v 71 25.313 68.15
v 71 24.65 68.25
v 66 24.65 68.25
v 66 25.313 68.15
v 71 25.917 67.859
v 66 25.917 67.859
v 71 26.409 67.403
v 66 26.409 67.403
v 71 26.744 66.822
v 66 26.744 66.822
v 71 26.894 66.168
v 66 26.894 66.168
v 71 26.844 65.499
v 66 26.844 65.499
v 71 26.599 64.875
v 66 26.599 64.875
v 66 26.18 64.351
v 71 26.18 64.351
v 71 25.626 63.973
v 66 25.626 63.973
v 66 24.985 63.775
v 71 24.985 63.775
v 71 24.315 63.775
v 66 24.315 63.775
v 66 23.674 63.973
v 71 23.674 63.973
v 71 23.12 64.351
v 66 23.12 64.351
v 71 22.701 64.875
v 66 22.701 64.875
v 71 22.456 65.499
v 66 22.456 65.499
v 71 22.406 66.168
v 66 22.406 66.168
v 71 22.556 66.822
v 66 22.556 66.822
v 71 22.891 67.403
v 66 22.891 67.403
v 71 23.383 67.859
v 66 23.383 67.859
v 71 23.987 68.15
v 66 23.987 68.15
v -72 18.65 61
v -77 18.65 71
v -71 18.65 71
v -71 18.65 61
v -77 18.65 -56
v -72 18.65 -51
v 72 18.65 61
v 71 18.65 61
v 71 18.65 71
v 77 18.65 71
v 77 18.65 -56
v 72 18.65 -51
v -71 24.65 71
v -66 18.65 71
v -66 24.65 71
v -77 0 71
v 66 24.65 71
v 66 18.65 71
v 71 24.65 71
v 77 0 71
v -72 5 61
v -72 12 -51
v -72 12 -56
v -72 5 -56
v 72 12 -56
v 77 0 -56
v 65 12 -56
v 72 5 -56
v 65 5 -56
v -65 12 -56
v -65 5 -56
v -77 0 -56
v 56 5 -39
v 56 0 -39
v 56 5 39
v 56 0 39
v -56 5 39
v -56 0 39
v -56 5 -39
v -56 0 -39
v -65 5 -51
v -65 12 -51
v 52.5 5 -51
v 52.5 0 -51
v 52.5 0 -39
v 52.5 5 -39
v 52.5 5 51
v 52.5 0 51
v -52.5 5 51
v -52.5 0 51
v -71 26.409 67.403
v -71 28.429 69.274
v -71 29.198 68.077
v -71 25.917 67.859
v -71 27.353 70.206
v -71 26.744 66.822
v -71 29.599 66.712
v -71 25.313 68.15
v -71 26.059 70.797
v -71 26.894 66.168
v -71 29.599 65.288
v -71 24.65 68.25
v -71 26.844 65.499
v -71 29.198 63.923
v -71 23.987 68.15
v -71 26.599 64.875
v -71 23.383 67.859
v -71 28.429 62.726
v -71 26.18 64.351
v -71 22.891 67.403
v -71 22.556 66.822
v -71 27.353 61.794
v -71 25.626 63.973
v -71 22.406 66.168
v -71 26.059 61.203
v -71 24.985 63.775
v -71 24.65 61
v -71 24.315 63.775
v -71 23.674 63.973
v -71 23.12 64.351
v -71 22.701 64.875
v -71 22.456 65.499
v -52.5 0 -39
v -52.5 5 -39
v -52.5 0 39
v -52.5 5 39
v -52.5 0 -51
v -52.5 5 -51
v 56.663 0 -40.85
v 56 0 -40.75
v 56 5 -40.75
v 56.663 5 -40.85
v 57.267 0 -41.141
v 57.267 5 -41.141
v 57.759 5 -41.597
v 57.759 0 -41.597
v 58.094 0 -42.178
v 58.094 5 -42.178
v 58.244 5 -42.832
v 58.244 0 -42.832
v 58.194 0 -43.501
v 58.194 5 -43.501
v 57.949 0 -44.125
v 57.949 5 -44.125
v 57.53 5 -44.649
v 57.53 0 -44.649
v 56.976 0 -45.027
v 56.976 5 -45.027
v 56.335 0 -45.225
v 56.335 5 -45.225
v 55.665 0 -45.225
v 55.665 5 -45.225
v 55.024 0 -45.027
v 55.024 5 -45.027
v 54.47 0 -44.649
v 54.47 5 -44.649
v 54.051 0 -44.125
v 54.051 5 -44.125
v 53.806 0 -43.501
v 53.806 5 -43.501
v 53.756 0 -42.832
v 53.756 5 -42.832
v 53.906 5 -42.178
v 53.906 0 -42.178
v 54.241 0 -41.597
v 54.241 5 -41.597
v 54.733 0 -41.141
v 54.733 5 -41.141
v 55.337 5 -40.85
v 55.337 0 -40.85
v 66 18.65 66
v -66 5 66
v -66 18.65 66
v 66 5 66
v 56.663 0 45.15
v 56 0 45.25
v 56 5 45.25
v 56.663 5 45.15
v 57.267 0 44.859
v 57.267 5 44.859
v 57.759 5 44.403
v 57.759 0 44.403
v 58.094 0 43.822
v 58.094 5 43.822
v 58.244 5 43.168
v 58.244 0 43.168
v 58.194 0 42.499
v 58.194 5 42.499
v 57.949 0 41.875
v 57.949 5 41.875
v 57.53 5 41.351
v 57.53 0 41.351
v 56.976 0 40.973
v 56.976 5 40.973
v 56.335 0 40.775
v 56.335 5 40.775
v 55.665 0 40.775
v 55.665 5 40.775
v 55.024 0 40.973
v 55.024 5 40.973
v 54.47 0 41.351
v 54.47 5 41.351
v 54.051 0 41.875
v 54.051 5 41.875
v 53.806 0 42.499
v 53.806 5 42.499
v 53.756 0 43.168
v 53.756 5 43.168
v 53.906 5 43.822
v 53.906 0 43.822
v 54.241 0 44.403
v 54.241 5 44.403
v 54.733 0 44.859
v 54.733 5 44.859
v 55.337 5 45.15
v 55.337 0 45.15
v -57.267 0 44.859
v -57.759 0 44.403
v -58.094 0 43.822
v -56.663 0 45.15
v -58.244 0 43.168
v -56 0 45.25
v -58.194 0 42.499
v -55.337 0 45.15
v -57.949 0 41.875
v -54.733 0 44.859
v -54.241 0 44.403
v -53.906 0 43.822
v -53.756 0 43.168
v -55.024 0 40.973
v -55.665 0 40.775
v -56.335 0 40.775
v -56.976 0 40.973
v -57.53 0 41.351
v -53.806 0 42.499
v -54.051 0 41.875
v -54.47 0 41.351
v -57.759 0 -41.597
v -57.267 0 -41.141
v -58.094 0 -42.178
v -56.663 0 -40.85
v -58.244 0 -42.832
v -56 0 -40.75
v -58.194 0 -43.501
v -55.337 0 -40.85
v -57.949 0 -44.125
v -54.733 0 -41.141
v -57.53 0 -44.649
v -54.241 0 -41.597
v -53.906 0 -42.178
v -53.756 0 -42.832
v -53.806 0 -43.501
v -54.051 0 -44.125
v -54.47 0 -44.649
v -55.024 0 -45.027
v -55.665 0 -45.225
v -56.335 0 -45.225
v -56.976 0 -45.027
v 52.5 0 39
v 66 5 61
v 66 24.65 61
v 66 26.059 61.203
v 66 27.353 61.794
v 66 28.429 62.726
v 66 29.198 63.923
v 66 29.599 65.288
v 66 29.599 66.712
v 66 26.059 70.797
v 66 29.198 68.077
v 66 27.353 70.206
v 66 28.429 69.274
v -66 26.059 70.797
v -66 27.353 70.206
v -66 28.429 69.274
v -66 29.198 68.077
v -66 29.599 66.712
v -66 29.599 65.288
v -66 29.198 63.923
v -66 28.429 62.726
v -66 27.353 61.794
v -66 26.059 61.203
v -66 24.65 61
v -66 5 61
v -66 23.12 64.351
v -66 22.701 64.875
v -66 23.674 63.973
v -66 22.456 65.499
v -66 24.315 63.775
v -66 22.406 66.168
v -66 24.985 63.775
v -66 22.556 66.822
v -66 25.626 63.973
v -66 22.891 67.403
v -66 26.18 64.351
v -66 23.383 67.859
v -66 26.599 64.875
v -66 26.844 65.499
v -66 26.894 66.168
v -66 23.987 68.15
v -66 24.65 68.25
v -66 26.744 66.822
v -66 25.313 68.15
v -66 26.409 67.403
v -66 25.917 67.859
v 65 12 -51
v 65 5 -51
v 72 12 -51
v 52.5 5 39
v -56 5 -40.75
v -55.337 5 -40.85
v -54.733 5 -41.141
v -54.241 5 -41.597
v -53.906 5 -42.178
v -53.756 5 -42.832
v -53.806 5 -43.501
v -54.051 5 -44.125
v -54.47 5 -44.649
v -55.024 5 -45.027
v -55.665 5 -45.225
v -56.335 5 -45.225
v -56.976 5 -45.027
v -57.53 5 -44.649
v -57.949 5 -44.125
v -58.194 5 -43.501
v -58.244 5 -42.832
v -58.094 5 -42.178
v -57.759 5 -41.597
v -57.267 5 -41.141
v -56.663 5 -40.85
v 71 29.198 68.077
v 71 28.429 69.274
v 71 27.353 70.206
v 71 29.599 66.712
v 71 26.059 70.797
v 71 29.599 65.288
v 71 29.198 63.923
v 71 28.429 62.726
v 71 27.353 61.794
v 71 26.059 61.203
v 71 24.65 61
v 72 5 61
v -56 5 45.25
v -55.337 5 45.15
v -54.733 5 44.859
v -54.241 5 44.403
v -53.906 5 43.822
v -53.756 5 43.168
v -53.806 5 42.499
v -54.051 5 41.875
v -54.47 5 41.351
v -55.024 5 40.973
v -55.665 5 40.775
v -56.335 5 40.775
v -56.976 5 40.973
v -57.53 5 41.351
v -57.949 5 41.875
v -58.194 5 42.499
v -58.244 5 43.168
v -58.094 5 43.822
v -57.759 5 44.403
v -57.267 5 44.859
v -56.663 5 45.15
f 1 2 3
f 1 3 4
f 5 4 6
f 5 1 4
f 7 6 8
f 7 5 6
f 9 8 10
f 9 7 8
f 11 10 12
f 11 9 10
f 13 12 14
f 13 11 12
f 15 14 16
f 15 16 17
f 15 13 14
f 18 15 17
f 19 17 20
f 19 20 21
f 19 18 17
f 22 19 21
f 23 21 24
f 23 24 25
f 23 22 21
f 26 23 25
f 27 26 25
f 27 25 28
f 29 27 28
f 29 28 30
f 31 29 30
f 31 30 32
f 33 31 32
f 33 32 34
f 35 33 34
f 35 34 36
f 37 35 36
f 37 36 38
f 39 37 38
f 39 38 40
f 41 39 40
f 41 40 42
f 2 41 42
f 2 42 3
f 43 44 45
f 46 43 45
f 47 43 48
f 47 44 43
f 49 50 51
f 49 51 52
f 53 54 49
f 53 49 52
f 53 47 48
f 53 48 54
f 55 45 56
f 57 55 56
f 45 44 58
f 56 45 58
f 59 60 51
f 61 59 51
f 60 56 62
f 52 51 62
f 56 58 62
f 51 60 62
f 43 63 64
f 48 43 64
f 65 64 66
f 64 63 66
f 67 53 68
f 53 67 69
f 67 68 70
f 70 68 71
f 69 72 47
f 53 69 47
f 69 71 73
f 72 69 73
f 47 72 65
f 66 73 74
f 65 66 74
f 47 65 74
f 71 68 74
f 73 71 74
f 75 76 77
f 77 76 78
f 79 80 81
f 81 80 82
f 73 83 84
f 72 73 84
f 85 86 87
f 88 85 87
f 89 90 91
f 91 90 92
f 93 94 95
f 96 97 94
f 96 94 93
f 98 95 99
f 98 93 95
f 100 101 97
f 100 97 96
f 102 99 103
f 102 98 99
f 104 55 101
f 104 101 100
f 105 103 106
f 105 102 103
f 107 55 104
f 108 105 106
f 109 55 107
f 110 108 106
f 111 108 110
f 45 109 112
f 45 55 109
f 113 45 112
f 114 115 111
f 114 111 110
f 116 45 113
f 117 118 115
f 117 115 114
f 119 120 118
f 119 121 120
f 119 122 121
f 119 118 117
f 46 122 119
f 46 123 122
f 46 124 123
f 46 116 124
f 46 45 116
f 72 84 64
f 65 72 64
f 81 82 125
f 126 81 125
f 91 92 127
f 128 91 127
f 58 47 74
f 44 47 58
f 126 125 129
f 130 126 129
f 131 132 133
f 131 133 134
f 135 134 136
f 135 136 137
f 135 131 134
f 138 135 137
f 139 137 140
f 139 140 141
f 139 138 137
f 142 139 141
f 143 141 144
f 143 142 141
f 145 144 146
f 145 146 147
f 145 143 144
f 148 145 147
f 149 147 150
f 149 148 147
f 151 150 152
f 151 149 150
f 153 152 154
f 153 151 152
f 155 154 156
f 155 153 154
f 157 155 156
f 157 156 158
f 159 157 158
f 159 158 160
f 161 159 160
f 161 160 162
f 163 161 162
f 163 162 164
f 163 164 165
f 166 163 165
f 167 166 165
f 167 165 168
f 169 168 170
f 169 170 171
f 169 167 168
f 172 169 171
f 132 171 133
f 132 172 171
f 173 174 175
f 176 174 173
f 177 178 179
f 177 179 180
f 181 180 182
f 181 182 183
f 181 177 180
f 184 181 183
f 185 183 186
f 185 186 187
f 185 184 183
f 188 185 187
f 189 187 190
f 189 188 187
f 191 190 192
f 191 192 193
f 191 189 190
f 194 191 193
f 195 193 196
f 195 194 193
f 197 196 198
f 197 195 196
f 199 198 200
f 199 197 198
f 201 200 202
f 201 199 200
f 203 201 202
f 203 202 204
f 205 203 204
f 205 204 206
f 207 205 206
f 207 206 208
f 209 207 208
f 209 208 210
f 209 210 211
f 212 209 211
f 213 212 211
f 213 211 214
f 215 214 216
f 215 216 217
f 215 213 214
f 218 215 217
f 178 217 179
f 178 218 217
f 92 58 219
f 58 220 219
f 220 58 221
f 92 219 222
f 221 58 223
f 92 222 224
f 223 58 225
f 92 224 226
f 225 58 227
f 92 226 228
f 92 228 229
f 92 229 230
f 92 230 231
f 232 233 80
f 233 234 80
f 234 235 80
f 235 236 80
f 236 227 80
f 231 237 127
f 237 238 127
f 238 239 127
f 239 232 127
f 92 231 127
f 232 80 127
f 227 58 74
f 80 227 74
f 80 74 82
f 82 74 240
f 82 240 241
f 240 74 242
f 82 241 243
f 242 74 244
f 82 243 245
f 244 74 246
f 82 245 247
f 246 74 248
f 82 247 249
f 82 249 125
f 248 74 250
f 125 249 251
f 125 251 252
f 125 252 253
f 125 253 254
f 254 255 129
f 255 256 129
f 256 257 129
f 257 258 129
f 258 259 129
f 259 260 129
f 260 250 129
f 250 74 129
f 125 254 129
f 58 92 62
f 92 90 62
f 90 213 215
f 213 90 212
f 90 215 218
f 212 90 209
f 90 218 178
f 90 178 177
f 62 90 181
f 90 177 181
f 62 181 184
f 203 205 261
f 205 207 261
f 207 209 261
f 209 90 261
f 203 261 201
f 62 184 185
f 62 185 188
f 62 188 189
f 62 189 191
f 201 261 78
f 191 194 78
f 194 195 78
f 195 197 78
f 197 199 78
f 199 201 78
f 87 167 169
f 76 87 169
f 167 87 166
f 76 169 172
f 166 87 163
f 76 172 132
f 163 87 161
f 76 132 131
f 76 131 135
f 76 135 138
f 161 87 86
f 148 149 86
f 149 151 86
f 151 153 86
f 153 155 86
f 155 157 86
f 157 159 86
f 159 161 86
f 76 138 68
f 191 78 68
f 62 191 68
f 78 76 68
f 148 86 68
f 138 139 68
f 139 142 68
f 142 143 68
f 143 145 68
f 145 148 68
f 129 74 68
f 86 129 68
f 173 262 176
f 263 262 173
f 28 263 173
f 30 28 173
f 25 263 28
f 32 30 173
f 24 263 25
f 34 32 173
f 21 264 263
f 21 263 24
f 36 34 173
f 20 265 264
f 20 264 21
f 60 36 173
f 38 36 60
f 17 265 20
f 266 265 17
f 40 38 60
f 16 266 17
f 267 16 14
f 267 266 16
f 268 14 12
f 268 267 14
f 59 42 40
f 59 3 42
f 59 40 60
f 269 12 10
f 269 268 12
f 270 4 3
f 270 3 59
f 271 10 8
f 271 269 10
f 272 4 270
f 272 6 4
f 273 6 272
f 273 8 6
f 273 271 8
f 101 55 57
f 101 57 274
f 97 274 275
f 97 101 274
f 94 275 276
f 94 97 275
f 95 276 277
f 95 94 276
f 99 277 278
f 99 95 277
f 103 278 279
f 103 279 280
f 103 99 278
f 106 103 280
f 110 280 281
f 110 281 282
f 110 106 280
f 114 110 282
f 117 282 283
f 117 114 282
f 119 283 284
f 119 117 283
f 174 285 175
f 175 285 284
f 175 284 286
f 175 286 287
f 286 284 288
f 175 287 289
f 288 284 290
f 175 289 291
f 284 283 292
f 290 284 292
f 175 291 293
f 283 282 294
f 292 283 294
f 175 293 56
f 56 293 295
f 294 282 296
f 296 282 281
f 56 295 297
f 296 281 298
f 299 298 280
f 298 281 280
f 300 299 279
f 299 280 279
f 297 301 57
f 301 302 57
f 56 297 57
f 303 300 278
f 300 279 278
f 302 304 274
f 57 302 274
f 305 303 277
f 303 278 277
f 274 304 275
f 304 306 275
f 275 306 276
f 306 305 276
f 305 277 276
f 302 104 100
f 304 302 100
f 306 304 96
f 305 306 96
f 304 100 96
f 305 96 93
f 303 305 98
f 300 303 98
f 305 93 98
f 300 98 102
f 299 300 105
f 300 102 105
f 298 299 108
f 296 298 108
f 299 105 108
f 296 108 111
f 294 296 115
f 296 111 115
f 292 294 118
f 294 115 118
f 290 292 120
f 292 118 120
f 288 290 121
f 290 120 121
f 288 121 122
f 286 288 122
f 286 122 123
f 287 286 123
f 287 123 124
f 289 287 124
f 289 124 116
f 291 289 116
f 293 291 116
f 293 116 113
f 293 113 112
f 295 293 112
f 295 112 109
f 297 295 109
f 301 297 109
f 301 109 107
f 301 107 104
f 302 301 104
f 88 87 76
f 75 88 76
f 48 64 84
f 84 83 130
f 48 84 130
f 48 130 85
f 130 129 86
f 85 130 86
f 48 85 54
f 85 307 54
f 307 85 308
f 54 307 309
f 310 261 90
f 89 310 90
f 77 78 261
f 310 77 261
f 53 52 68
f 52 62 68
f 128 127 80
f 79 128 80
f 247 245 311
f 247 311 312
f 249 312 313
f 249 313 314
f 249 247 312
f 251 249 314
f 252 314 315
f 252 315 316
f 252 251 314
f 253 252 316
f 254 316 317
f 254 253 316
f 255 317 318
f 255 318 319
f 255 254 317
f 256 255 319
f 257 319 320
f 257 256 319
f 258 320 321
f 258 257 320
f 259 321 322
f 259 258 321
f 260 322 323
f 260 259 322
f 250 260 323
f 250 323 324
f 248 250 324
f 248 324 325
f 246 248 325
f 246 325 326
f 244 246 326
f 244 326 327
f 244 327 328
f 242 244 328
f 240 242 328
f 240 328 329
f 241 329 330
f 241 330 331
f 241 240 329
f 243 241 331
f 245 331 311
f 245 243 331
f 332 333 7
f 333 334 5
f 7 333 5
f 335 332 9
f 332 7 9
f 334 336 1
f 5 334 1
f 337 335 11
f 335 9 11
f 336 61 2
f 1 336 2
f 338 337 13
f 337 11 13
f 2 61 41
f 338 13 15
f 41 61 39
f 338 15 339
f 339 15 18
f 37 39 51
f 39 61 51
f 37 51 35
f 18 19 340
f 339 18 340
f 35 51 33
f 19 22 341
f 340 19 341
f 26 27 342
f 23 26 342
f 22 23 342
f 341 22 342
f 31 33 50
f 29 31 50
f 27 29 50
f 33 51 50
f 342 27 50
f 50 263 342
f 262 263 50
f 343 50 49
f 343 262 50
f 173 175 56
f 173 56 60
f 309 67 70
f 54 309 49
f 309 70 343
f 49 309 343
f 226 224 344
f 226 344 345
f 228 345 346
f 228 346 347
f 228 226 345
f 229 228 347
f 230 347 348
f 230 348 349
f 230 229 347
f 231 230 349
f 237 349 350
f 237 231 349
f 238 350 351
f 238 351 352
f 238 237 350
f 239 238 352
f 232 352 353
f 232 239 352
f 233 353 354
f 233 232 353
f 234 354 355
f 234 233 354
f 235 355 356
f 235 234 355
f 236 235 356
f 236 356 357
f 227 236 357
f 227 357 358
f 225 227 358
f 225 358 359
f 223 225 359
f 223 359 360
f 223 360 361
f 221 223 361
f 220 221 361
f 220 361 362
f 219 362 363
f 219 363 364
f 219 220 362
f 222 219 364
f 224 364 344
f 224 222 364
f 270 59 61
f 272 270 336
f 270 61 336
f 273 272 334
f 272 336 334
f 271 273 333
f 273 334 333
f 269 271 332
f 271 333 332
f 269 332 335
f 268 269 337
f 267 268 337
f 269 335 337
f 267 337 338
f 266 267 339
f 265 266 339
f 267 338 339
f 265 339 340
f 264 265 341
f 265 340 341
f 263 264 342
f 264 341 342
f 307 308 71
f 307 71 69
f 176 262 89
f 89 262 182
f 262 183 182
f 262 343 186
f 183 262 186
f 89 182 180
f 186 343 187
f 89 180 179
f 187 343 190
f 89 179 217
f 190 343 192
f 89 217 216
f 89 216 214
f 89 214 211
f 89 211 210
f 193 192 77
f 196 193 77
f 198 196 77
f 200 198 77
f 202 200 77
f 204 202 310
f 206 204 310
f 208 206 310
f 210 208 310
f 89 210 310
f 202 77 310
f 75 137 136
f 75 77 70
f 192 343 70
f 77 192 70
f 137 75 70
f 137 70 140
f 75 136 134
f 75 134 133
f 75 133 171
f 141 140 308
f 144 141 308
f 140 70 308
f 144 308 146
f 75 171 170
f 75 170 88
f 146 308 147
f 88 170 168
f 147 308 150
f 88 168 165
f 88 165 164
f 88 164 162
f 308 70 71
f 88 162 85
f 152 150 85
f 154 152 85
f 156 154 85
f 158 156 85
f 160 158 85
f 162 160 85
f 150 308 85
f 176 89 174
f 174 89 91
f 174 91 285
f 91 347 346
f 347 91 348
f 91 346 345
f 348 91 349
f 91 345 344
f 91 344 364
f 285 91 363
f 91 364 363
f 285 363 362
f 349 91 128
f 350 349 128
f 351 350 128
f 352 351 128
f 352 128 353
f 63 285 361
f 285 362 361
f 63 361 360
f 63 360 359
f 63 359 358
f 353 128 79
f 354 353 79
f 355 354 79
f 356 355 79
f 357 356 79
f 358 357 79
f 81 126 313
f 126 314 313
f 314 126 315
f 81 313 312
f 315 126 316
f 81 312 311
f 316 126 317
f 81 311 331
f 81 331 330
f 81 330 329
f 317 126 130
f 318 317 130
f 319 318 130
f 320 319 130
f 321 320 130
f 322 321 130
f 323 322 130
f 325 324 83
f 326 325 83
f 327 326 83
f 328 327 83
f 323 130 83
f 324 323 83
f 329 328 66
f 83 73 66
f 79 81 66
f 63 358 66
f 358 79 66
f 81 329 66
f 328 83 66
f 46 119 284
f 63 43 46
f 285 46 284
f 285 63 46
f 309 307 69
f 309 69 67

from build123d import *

# Parameters (mm, degrees)
SKETCH1_W           = 154
SKETCH1_H           = 127
SKETCH1_R           = 2.25
BOSS_EXTRUDE1_DEPTH = 5
SKETCH2_R           = 2.25
BOSS_EXTRUDE2_DEPTH = 11
SKETCH4_W           = 6
SKETCH4_H           = 10
CUT_EXTRUDE1_DEPTH  = 37
SKETCH5_W           = 132
SKETCH5_H           = 5
SKETCH5_W_2         = 1
SKETCH5_W_3         = 6
BOSS_EXTRUDE3_DEPTH = 13.65
SKETCH6_W           = 7
SKETCH6_H           = 7
CUT_EXTRUDE2_DEPTH  = 13.65


with BuildPart() as part:
    # Sketch1 → Boss-Extrude1 (new body)
    with BuildSketch(Plane(origin=(0, 0, 0), x_dir=(1, 0, 0), z_dir=(0, 1, 0))):
        with Locations((0, -7.5)):
            Rectangle(SKETCH1_W, SKETCH1_H)
        with Locations(Location((-56, -43, 0), (0, 0, 270))):
            Circle(SKETCH1_R, mode=Mode.SUBTRACT)
        with Locations(Location((56, -43, 0), (0, 0, 270))):
            Circle(SKETCH1_R, mode=Mode.SUBTRACT)
        with Locations(Location((-56, 43, 0), (0, 0, 270))):
            Circle(SKETCH1_R, mode=Mode.SUBTRACT)
        Polygon((52.5, -39), (52.5, -51), (-52.5, -51), (-52.5, -39), (-56, -39), (-56, 39), (-52.5, 39), (-52.5, 51), (52.5, 51), (52.5, 39), (56, 39), (56, -39), align=None, mode=Mode.SUBTRACT)
        with Locations(Location((56, 43, 0), (0, 0, 270))):
            Circle(SKETCH1_R, mode=Mode.SUBTRACT)
    extrude(amount=BOSS_EXTRUDE1_DEPTH)

    # Sketch2 → Boss-Extrude2 (add)
    with BuildSketch(Plane.ZY.offset(77)):
        with BuildLine():
            ThreePointArc((71, 24.65), (66, 29.65), (61, 24.65))
            Line((61, 24.65), (61, 5))
            Line((61, 5), (71, 5))
            Line((71, 5), (71, 24.65))
        make_face()
        with Locations((66, 24.65)):
            Circle(SKETCH2_R, mode=Mode.SUBTRACT)
    boss_extrude2 = extrude(amount=-BOSS_EXTRUDE2_DEPTH)

    # Sketch4 → Cut-Extrude1 (cut)
    with BuildSketch(Plane(origin=(0, 5, 0), x_dir=(1, 0, 0), z_dir=(0, 1, 0))):
        with Locations((-74, -66)):
            Rectangle(SKETCH4_W, SKETCH4_H)
    cut_extrude1 = extrude(amount=CUT_EXTRUDE1_DEPTH, mode=Mode.SUBTRACT)

    # Mirror1: Boss-Extrude2, Cut-Extrude1 across plane
    add(boss_extrude2.mirror(Plane(origin=(0, 0, 0), x_dir=(0, 0, 1), z_dir=(1, 0, 0))))
    add(cut_extrude1.mirror(Plane(origin=(0, 0, 0), x_dir=(0, 0, 1), z_dir=(1, 0, 0))), mode=Mode.SUBTRACT)

    # Sketch5 → Boss-Extrude3 (add)
    with BuildSketch(Plane(origin=(0, 5, 0), x_dir=(1, 0, 0), z_dir=(0, 1, 0))):
        Polygon((71, -71), (77, -71), (77, 56), (-77, 56), (-77, -71), (-71, -71), (-71, -66), (-72, -66), (-72, -61), (-72, 51), (-52.5, 51), (52.5, 51), (72, 51), (72, -61), (72, -66), (71, -66), align=None)
        with Locations((0, -68.5)):
            Rectangle(SKETCH5_W, SKETCH5_H)
        with Locations((71.5, -63.5)):
            Rectangle(SKETCH5_W_2, SKETCH5_H)
        with Locations((-69, -63.5)):
            Rectangle(SKETCH5_W_3, SKETCH5_H)
    extrude(amount=BOSS_EXTRUDE3_DEPTH)

    # Sketch6 → Cut-Extrude2 (cut)
    with BuildSketch(Plane.XY.offset(-51)):
        with Locations((68.5, 8.5)):
            Rectangle(SKETCH6_W, SKETCH6_H)
    cut_extrude2 = extrude(amount=-CUT_EXTRUDE2_DEPTH, mode=Mode.SUBTRACT)

    # Mirror2: Cut-Extrude2 across plane
    add(cut_extrude2.mirror(Plane(origin=(0, 0, 0), x_dir=(0, 0, 1), z_dir=(1, 0, 0))), mode=Mode.SUBTRACT)


solid = part.part
